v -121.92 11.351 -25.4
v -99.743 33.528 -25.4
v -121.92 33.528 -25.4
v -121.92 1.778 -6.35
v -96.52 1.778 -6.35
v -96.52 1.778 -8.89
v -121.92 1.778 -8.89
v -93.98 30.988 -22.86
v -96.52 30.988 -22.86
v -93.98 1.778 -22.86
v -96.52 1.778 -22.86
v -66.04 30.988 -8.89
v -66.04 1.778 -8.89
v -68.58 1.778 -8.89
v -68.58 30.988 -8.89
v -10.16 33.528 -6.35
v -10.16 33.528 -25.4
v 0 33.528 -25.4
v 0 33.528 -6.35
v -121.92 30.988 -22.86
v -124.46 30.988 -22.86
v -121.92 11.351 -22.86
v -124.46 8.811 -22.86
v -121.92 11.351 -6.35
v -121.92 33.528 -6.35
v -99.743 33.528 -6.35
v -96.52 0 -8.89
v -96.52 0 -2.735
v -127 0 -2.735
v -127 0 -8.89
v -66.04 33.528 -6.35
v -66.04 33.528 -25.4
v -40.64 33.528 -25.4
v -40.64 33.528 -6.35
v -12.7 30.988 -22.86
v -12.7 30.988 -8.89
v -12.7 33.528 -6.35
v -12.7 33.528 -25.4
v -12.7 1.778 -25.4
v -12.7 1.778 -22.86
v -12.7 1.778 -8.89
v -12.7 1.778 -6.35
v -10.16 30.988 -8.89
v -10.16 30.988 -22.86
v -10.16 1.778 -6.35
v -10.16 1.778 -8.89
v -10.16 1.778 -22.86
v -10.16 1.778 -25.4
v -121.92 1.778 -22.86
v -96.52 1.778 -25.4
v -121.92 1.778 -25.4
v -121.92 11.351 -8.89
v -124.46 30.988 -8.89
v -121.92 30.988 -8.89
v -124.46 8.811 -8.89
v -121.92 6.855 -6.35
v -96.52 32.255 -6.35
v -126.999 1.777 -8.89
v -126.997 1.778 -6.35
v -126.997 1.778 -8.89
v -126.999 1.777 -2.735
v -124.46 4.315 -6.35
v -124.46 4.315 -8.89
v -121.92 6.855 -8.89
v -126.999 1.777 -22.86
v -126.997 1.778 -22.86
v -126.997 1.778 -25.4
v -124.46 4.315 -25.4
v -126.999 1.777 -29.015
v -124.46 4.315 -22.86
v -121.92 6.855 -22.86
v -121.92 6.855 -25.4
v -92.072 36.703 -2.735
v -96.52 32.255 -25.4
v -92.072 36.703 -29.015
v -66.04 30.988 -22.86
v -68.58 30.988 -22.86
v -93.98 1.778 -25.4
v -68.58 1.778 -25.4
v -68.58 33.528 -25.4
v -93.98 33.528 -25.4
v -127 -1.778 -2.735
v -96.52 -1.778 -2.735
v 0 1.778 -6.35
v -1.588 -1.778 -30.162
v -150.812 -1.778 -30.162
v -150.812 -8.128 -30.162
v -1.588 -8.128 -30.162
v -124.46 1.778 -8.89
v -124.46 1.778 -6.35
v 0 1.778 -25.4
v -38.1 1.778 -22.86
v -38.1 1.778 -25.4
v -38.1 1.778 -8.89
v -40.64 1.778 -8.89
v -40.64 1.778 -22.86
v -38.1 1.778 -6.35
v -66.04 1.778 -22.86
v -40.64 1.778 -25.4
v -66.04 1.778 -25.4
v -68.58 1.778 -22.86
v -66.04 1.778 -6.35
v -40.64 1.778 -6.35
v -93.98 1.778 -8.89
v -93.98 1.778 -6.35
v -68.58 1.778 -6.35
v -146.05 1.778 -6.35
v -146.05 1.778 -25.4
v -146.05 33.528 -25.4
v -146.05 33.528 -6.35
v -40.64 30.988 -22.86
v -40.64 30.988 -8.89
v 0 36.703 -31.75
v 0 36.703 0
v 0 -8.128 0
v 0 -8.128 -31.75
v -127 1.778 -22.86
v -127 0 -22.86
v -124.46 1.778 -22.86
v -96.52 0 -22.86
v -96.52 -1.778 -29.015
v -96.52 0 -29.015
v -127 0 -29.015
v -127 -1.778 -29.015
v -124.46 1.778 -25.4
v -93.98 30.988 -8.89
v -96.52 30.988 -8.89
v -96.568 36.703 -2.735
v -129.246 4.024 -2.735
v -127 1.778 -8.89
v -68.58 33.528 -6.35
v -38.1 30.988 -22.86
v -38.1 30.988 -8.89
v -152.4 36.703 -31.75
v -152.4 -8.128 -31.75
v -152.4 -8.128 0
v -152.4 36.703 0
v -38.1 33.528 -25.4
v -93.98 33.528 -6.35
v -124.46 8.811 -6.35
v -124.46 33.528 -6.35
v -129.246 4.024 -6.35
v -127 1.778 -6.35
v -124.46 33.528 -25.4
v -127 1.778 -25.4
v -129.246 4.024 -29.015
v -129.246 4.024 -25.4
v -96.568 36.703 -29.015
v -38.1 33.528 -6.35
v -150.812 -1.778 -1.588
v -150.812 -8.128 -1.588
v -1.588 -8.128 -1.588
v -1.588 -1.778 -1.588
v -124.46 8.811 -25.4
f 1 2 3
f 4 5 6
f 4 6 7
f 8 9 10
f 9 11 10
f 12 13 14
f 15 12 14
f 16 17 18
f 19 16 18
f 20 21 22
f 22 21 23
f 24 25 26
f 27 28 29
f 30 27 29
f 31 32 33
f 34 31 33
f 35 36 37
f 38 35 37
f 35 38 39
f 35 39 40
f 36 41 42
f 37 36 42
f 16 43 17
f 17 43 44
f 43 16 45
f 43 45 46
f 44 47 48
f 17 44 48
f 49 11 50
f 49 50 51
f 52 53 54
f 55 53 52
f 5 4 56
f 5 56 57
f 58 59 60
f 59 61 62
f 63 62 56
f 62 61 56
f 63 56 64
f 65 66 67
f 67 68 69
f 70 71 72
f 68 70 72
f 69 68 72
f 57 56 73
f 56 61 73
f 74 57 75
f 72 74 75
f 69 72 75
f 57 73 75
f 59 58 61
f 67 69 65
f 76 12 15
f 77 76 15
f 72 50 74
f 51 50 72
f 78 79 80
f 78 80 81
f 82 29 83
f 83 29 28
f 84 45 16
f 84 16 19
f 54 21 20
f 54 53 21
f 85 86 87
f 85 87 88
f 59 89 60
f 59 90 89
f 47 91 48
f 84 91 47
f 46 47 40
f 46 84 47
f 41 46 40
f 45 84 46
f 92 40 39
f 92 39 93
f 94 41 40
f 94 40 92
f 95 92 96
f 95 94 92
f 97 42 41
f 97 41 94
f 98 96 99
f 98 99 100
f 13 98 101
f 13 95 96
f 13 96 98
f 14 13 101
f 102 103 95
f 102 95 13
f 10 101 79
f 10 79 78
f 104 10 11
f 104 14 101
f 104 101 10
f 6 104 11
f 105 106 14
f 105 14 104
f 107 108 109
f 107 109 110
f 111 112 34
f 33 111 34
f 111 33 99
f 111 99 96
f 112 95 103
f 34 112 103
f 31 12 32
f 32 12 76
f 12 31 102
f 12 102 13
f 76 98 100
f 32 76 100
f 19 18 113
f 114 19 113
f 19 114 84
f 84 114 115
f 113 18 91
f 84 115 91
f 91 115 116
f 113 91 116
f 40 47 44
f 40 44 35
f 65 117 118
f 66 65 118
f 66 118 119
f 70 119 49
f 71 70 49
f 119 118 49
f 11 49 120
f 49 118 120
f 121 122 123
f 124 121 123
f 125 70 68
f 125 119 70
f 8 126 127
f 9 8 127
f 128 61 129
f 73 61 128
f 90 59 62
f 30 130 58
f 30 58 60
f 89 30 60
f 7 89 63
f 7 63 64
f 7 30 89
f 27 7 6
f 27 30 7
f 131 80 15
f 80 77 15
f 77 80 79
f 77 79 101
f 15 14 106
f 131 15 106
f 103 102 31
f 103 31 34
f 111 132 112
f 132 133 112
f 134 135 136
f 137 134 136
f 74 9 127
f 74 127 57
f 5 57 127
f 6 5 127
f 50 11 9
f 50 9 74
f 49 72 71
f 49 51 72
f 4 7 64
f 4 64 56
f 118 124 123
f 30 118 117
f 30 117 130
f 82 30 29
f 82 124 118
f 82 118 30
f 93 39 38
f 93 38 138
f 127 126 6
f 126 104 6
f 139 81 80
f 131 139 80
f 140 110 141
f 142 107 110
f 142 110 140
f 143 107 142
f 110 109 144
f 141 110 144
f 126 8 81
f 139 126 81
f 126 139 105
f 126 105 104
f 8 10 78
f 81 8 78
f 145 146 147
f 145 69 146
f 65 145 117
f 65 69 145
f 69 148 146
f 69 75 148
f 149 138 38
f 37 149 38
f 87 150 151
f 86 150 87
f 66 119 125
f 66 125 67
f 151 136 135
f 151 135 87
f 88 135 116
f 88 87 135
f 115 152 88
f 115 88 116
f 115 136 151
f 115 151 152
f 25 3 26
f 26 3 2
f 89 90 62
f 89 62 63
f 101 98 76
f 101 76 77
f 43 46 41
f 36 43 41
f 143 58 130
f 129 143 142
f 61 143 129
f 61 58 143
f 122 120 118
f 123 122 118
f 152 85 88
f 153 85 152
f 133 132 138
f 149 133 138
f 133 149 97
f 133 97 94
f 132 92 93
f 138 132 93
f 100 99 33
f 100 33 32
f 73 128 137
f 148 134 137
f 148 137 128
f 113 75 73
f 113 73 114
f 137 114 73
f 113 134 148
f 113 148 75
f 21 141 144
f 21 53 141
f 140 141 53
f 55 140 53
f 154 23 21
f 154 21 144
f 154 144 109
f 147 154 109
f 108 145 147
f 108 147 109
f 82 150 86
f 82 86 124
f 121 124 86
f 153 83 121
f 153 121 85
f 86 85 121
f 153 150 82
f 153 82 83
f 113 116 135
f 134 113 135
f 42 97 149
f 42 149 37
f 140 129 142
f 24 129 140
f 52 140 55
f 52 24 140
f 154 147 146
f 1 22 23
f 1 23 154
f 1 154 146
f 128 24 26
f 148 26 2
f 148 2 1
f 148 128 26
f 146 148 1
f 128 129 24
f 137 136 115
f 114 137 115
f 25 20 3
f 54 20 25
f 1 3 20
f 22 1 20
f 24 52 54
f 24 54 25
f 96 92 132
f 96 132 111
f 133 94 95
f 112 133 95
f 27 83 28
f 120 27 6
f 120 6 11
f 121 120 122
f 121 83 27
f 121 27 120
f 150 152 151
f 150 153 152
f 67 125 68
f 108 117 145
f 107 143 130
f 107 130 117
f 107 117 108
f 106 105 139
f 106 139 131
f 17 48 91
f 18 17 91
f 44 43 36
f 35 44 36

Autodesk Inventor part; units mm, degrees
ref_plane "YZ Plane" through (0, 0, 0) normal (1, 0, 0) x (0, 1, 0)
ref_plane "XZ Plane" through (0, 0, 0) normal (0, 1, 0) x (-1, 0, 0)
ref_plane "XY Plane" through (0, 0, 0) normal (0, 0, 1) x (1, 0, 0)
sketch "Sketch1" plane through (0, 0, 0) normal (0, 1, 0) x (-1, 0, 0)
  line L0 (0, 0) -> (152.4, 0)
  line L1 (152.4, 0) -> (152.4, -31.75)
  line L2 (152.4, -31.75) -> (0, -31.75)
  line L3 (0, -31.75) -> (0, 0)
  line L4 (127, -8.89) -> (96.52, -8.89)
  line L5 (96.52, -8.89) -> (96.52, -22.86)
  line L6 (96.52, -22.86) -> (127, -22.86)
  line L7 (127, -22.86) -> (127, -8.89)
  line L8 (117.2368, -8.89) -> (117.2368, 0)
  line L9 (117.2368, -22.86) -> (117.2368, -31.75)
  dimension "d0" = 152.4
  dimension "d1" = 31.75
  dimension "d2" = 30.48
  dimension "d3" = 13.97
  dimension "d4" = 25.4
extrude "Extrusion1" add sketch "Sketch1" along normal blind 1.778 contours L0 L8 L4 L5 L6 L9 L2 L3 | L0 L1 L2 L9 L6 L7 L4 L8
sketch "Sketch2" plane through (0, 0, 0) normal (0, -1, 0) x (1, 0, 0)
  line L0 (-152.4, 0) -> (0, 0) projected
  line L1 (0, 0) -> (0, -31.75) projected
  line L2 (-152.4, 0) -> (0, 0)
  line L3 (0, 0) -> (0, -31.75)
  line L4 (0, -31.75) -> (-152.4, -31.75)
  line L5 (-152.4, -31.75) -> (-152.4, 0)
  line L6 (-127, -2.7348) -> (-96.52, -2.7348)
  line L7 (-96.52, -2.7348) -> (-96.52, -29.0152)
  line L8 (-96.52, -29.0152) -> (-127, -29.0152)
  line L9 (-127, -29.0152) -> (-127, -2.7348)
  line L10 (-127, -8.89) -> (-127, -22.86) projected
  line L11 (-103.8171, -2.7348) -> (-103.8171, 0)
  line L12 (-104.7941, -29.0152) -> (-104.7941, -31.75)
  line L13 (0, -31.75) -> (-152.4, -31.75) projected
  dimension "d7" = 30.48
  dimension "d8" = 0
extrude "Extrusion2" add sketch "Sketch2" along normal blind 1.778 contours L0 L11 L6 L9 L8 L12 L4 L5 | L0 L1 L4 L12 L8 L7 L6 L11
sketch "Sketch3" plane through (0, -1.778, 0) normal (0, -1, 0) x (1, 0, 0)
  line L0 (-152.4, 0) -> (0, 0) projected
  line L1 (0, -31.75) -> (-152.4, -31.75) projected
  line L2 (-152.4, 0) -> (0, 0)
  line L3 (0, 0) -> (0, -31.75)
  line L4 (0, -31.75) -> (-152.4, -31.75)
  line L5 (-152.4, -31.75) -> (-152.4, 0)
  line L6 (-1.5875, -30.1625) -> (-1.5875, -1.5875)
  line L7 (-1.5875, -1.5875) -> (-150.8125, -1.5875)
  line L8 (-150.8125, -1.5875) -> (-150.8125, -30.1625)
  line L9 (-150.8125, -30.1625) -> (-1.5875, -30.1625)
  dimension "d11" = 1.5875
extrude "Extrusion3" add sketch "Sketch3" along normal blind 6.35
sketch "Sketch4" plane through (0, 1.778, 0) normal (0, 1, 0) x (1, 0, 0)
  line L0 (-152.4, 0) -> (0, 0) projected
  line L1 (-152.4, 31.75) -> (-152.4, 0) projected
  line L2 (0, 0) -> (-152.4, 0)
  line L3 (-152.4, 0) -> (-152.4, 31.75)
  line L4 (-152.4, 31.75) -> (0, 31.75)
  line L5 (-6.35, 25.4) -> (-146.05, 25.4)
  line L6 (-146.05, 25.4) -> (-146.05, 6.35)
  line L7 (-146.05, 6.35) -> (-6.35, 6.35)
  line L8 (-13.5859, 25.4) -> (0, 25.4)
  line L9 (0, 0) -> (0, 31.75) projected
  line L10 (-13.5859, 6.35) -> (0, 6.35)
  line L11 (0, 31.75) -> (0, 25.4)
  line L12 (0, 6.35) -> (0, 0)
  line L13 (-127, 22.86) -> (-96.52, 22.86) projected
  line L14 (-96.52, 22.86) -> (-93.98, 22.86)
  line L15 (-93.98, 22.86) -> (-93.98, 25.4)
  line L16 (-93.98, 25.4) -> (-96.52, 25.4)
  line L17 (-96.52, 25.4) -> (-96.52, 22.86)
  line L18 (-96.52, 2.7348) -> (-96.52, 29.0152) projected
  line L19 (-96.52, 6.35) -> (-93.98, 6.35)
  line L20 (-93.98, 6.35) -> (-93.98, 8.89)
  line L21 (-93.98, 8.89) -> (-96.52, 8.89)
  line L22 (-96.52, 8.89) -> (-96.52, 6.35)
  line L23 (-121.92, 25.4) -> (-124.46, 25.4)
  line L24 (-124.46, 25.4) -> (-124.46, 22.86)
  line L25 (-124.46, 22.86) -> (-121.92, 22.86)
  line L26 (-121.92, 22.86) -> (-121.92, 25.4)
  line L27 (-121.92, 6.35) -> (-124.46, 6.35)
  line L28 (-124.46, 6.35) -> (-124.46, 8.89)
  line L29 (-124.46, 8.89) -> (-121.92, 8.89)
  line L30 (-121.92, 8.89) -> (-121.92, 6.35)
  line L31 (-68.58, 25.4) -> (-66.04, 25.4)
  line L32 (-66.04, 25.4) -> (-66.04, 22.86)
  line L33 (-66.04, 22.86) -> (-68.58, 22.86)
  line L34 (-68.58, 22.86) -> (-68.58, 25.4)
  line L35 (-68.58, 6.35) -> (-66.04, 6.35)
  line L36 (-66.04, 6.35) -> (-66.04, 8.89)
  line L37 (-66.04, 8.89) -> (-68.58, 8.89)
  line L38 (-68.58, 8.89) -> (-68.58, 6.35)
  line L39 (-40.64, 6.35) -> (-38.1, 6.35)
  line L40 (-38.1, 6.35) -> (-38.1, 8.89)
  line L41 (-38.1, 8.89) -> (-40.64, 8.89)
  line L42 (-40.64, 8.89) -> (-40.64, 6.35)
  line L43 (-40.64, 25.4) -> (-38.1, 25.4)
  line L44 (-38.1, 25.4) -> (-38.1, 22.86)
  line L45 (-38.1, 22.86) -> (-40.64, 22.86)
  line L46 (-40.64, 22.86) -> (-40.64, 25.4)
  line L47 (-12.7, 25.4) -> (-10.16, 25.4)
  line L48 (-10.16, 25.4) -> (-10.16, 22.86)
  line L49 (-10.16, 22.86) -> (-12.7, 22.86)
  line L50 (-12.7, 22.86) -> (-12.7, 25.4)
  line L51 (-12.7, 6.35) -> (-10.16, 6.35)
  line L52 (-10.16, 6.35) -> (-10.16, 8.89)
  line L53 (-10.16, 8.89) -> (-12.7, 8.89)
  line L54 (-12.7, 8.89) -> (-12.7, 6.35)
  point P0 (-121.92, 7.62)
  point P1 (-96.52, 7.62)
  point P2 (-93.98, 24.13)
  point P3 (-68.58, 24.13)
  point P4 (-40.64, 24.13)
  point P5 (-66.04, 24.13)
  point P6 (-12.7, 24.13)
  point P7 (-38.1, 24.13)
  point P8 (-6.35, 6.35)
  dimension "d14" = 6.35
  dimension "d15" = 2.54
  dimension "d16" = 2.54
  dimension "d17" = 2.54
  dimension "d18" = 2.54
  dimension "d19" = 2.54
  dimension "d20" = 2.54
  dimension "d21" = 25.4
  dimension "d22" = 2.54
  dimension "d23" = 2.54
  dimension "d24" = 2.54
  dimension "d25" = 2.54
  dimension "d26" = 2.54
  dimension "d27" = 2.54
  dimension "d28" = 2.54
  dimension "d29" = 2.54
  dimension "d30" = 2.54
  dimension "d31" = 2.54
  dimension "d32" = 2.54
  dimension "d33" = 2.54
  dimension "d34" = 25.4
  dimension "d35" = 25.4
  dimension "d36" = 25.4
extrude "Extrusion4" add sketch "Sketch4" along normal blind 31.75 contours L1 L4 L9 L8 L5 L6 L7 L10 L0 | L7 L54 L53 L52 | L48 L49 L50 L5 | L7 L42 L41 L40 | L44 L45 L46 L5 | L7 L38 L37 L36 | L32 L33 L34 L5 | L7 L18 L21 L20 | L15 L14 L17 L5 | L7 L28 L29 L30 | L26 L13 L24 L5
sketch "Sketch5" plane through (-93.98, 1.778, -8.89) normal (0, 0, -1) x (-1, 0, 0)
  line L0 (2.54, 31.75) -> (0, 31.75)
  line L1 (0, 31.75) -> (0, 29.21)
  line L2 (0, 29.21) -> (2.54, 29.21)
  line L3 (2.54, 29.21) -> (2.54, 31.75)
  line L4 (30.48, 31.75) -> (27.94, 31.75) projected
  line L5 (30.48, 0) -> (30.48, 31.75) projected
  line L6 (27.94, 31.75) -> (30.48, 31.75)
  line L7 (30.48, 31.75) -> (30.48, 29.21)
  line L8 (30.48, 29.21) -> (27.94, 29.21)
  line L9 (27.94, 29.21) -> (27.94, 31.75)
  line L10 (-27.94, 0) -> (-27.94, 31.75) projected
  line L11 (-25.4, 0) -> (-25.4, 31.75) projected
  line L12 (-27.94, 29.21) -> (-25.4, 29.21)
  line L13 (-25.4, 29.21) -> (-25.4, 31.75)
  line L14 (-25.4, 31.75) -> (-27.94, 31.75)
  line L15 (-27.94, 31.75) -> (-27.94, 29.21)
  line L16 (-93.98, 31.75) -> (58.42, 31.75) projected
  line L17 (-27.94, 31.75) -> (-25.4, 31.75)
  line L18 (-25.4, 31.75) -> (-25.4, 29.21)
  line L19 (-25.4, 29.21) -> (-27.94, 29.21)
  line L20 (-27.94, 29.21) -> (-27.94, 31.75)
  line L21 (-53.34, 31.75) -> (-55.88, 31.75)
  line L22 (-55.88, 31.75) -> (-55.88, 29.21)
  line L23 (-55.88, 29.21) -> (-53.34, 29.21)
  line L24 (-53.34, 29.21) -> (-53.34, 31.75)
  line L25 (-81.28, 31.75) -> (-83.82, 31.75)
  line L26 (-83.82, 31.75) -> (-83.82, 29.21)
  line L27 (-83.82, 29.21) -> (-81.28, 29.21)
  line L28 (-81.28, 29.21) -> (-81.28, 31.75)
  line L29 (30.48, 31.75) -> (52.07, 31.75) projected
  line L30 (30.48, 31.75) -> (27.94, 31.75)
  line L31 (27.94, 31.75) -> (27.94, 29.21)
  line L32 (27.94, 29.21) -> (30.48, 29.21)
  line L33 (30.48, 29.21) -> (30.48, 31.75)
  point P0 (-93.98, -1.778)
  point P1 (0, 30.48)
  point P2 (-25.4, 30.48)
  point P3 (-27.94, 30.48)
  point P4 (-53.34, 30.48)
  point P5 (-81.28, 30.48)
  point P6 (-55.88, 30.48)
  point P7 (27.94, 30.48)
  point P8 (2.54, 30.48)
  dimension "d39" = 2.54
  dimension "d40" = 2.54
  dimension "d41" = 2.54
  dimension "d42" = 2.54
  dimension "d43" = 2.54
  dimension "d44" = 2.54
  dimension "d45" = 25.4
  dimension "d46" = 25.4
  dimension "d47" = 2.54
  dimension "d48" = 2.54
  dimension "d49" = 25.4
  dimension "d50" = 2.54
  dimension "d51" = 2.54
  dimension "d52" = 25.4
extrude "Extrusion5" add sketch "Sketch5" along normal up to next
sketch "Sketch6" plane through (0, 33.528, 0) normal (0, 1, 0) x (1, 0, 0)
  line L0 (-152.4, 31.75) -> (-152.4, 0) projected
  line L1 (0, 31.75) -> (-152.4, 31.75) projected
  line L2 (-152.4, 0) -> (0, 0)
  line L3 (0, 0) -> (0, 31.75)
  line L4 (0, 31.75) -> (-152.4, 31.75)
  line L5 (-152.4, 31.75) -> (-152.4, 0)
extrude "Extrusion6" add sketch "Sketch6" along normal blind 3.175
ref_plane "Work Plane1" through (-127, 1.778, -8.89) normal (0.7071, -0.7071, 0) x (0, 0, -1)
sketch "Sketch7" plane through (-127, 1.778, -8.89) normal (0.7071, -0.7071, 0) x (0, 0, -1)
  line L0 (20.1252, -1.2572) -> (20.1252, 20.2954) projected
  line L1 (20.1252, 0) -> (-6.1552, 0)
  line L2 (-6.1552, 0) -> (-6.1552, 127)
  line L3 (-6.1552, 127) -> (20.1252, 127)
  line L4 (20.1252, 127) -> (20.1252, 0)
  line L5 (0, 0) -> (13.97, 0) projected
  point P0 (-8.89, 88.5453)
  point P1 (20.1252, 20.2954)
  dimension "d58" = 0
  dimension "d59" = 127
extrude "Extrusion7" cut sketch "Sketch7" against normal blind 3.175
sketch "Sketch8" plane through (0, 1.778, 0) normal (0, 1, 0) x (1, 0, 0)
  line L0 (63.8737, 171.7375) -> (-193.0507, 171.7375)
  line L1 (-193.0507, 171.7375) -> (-193.0507, -76.4775)
  line L2 (-193.0507, -76.4775) -> (63.8737, -76.4775)
  line L3 (63.8737, -76.4775) -> (63.8737, 171.7375)
  point P0 (0, 0)
properties part number "Full Print"
